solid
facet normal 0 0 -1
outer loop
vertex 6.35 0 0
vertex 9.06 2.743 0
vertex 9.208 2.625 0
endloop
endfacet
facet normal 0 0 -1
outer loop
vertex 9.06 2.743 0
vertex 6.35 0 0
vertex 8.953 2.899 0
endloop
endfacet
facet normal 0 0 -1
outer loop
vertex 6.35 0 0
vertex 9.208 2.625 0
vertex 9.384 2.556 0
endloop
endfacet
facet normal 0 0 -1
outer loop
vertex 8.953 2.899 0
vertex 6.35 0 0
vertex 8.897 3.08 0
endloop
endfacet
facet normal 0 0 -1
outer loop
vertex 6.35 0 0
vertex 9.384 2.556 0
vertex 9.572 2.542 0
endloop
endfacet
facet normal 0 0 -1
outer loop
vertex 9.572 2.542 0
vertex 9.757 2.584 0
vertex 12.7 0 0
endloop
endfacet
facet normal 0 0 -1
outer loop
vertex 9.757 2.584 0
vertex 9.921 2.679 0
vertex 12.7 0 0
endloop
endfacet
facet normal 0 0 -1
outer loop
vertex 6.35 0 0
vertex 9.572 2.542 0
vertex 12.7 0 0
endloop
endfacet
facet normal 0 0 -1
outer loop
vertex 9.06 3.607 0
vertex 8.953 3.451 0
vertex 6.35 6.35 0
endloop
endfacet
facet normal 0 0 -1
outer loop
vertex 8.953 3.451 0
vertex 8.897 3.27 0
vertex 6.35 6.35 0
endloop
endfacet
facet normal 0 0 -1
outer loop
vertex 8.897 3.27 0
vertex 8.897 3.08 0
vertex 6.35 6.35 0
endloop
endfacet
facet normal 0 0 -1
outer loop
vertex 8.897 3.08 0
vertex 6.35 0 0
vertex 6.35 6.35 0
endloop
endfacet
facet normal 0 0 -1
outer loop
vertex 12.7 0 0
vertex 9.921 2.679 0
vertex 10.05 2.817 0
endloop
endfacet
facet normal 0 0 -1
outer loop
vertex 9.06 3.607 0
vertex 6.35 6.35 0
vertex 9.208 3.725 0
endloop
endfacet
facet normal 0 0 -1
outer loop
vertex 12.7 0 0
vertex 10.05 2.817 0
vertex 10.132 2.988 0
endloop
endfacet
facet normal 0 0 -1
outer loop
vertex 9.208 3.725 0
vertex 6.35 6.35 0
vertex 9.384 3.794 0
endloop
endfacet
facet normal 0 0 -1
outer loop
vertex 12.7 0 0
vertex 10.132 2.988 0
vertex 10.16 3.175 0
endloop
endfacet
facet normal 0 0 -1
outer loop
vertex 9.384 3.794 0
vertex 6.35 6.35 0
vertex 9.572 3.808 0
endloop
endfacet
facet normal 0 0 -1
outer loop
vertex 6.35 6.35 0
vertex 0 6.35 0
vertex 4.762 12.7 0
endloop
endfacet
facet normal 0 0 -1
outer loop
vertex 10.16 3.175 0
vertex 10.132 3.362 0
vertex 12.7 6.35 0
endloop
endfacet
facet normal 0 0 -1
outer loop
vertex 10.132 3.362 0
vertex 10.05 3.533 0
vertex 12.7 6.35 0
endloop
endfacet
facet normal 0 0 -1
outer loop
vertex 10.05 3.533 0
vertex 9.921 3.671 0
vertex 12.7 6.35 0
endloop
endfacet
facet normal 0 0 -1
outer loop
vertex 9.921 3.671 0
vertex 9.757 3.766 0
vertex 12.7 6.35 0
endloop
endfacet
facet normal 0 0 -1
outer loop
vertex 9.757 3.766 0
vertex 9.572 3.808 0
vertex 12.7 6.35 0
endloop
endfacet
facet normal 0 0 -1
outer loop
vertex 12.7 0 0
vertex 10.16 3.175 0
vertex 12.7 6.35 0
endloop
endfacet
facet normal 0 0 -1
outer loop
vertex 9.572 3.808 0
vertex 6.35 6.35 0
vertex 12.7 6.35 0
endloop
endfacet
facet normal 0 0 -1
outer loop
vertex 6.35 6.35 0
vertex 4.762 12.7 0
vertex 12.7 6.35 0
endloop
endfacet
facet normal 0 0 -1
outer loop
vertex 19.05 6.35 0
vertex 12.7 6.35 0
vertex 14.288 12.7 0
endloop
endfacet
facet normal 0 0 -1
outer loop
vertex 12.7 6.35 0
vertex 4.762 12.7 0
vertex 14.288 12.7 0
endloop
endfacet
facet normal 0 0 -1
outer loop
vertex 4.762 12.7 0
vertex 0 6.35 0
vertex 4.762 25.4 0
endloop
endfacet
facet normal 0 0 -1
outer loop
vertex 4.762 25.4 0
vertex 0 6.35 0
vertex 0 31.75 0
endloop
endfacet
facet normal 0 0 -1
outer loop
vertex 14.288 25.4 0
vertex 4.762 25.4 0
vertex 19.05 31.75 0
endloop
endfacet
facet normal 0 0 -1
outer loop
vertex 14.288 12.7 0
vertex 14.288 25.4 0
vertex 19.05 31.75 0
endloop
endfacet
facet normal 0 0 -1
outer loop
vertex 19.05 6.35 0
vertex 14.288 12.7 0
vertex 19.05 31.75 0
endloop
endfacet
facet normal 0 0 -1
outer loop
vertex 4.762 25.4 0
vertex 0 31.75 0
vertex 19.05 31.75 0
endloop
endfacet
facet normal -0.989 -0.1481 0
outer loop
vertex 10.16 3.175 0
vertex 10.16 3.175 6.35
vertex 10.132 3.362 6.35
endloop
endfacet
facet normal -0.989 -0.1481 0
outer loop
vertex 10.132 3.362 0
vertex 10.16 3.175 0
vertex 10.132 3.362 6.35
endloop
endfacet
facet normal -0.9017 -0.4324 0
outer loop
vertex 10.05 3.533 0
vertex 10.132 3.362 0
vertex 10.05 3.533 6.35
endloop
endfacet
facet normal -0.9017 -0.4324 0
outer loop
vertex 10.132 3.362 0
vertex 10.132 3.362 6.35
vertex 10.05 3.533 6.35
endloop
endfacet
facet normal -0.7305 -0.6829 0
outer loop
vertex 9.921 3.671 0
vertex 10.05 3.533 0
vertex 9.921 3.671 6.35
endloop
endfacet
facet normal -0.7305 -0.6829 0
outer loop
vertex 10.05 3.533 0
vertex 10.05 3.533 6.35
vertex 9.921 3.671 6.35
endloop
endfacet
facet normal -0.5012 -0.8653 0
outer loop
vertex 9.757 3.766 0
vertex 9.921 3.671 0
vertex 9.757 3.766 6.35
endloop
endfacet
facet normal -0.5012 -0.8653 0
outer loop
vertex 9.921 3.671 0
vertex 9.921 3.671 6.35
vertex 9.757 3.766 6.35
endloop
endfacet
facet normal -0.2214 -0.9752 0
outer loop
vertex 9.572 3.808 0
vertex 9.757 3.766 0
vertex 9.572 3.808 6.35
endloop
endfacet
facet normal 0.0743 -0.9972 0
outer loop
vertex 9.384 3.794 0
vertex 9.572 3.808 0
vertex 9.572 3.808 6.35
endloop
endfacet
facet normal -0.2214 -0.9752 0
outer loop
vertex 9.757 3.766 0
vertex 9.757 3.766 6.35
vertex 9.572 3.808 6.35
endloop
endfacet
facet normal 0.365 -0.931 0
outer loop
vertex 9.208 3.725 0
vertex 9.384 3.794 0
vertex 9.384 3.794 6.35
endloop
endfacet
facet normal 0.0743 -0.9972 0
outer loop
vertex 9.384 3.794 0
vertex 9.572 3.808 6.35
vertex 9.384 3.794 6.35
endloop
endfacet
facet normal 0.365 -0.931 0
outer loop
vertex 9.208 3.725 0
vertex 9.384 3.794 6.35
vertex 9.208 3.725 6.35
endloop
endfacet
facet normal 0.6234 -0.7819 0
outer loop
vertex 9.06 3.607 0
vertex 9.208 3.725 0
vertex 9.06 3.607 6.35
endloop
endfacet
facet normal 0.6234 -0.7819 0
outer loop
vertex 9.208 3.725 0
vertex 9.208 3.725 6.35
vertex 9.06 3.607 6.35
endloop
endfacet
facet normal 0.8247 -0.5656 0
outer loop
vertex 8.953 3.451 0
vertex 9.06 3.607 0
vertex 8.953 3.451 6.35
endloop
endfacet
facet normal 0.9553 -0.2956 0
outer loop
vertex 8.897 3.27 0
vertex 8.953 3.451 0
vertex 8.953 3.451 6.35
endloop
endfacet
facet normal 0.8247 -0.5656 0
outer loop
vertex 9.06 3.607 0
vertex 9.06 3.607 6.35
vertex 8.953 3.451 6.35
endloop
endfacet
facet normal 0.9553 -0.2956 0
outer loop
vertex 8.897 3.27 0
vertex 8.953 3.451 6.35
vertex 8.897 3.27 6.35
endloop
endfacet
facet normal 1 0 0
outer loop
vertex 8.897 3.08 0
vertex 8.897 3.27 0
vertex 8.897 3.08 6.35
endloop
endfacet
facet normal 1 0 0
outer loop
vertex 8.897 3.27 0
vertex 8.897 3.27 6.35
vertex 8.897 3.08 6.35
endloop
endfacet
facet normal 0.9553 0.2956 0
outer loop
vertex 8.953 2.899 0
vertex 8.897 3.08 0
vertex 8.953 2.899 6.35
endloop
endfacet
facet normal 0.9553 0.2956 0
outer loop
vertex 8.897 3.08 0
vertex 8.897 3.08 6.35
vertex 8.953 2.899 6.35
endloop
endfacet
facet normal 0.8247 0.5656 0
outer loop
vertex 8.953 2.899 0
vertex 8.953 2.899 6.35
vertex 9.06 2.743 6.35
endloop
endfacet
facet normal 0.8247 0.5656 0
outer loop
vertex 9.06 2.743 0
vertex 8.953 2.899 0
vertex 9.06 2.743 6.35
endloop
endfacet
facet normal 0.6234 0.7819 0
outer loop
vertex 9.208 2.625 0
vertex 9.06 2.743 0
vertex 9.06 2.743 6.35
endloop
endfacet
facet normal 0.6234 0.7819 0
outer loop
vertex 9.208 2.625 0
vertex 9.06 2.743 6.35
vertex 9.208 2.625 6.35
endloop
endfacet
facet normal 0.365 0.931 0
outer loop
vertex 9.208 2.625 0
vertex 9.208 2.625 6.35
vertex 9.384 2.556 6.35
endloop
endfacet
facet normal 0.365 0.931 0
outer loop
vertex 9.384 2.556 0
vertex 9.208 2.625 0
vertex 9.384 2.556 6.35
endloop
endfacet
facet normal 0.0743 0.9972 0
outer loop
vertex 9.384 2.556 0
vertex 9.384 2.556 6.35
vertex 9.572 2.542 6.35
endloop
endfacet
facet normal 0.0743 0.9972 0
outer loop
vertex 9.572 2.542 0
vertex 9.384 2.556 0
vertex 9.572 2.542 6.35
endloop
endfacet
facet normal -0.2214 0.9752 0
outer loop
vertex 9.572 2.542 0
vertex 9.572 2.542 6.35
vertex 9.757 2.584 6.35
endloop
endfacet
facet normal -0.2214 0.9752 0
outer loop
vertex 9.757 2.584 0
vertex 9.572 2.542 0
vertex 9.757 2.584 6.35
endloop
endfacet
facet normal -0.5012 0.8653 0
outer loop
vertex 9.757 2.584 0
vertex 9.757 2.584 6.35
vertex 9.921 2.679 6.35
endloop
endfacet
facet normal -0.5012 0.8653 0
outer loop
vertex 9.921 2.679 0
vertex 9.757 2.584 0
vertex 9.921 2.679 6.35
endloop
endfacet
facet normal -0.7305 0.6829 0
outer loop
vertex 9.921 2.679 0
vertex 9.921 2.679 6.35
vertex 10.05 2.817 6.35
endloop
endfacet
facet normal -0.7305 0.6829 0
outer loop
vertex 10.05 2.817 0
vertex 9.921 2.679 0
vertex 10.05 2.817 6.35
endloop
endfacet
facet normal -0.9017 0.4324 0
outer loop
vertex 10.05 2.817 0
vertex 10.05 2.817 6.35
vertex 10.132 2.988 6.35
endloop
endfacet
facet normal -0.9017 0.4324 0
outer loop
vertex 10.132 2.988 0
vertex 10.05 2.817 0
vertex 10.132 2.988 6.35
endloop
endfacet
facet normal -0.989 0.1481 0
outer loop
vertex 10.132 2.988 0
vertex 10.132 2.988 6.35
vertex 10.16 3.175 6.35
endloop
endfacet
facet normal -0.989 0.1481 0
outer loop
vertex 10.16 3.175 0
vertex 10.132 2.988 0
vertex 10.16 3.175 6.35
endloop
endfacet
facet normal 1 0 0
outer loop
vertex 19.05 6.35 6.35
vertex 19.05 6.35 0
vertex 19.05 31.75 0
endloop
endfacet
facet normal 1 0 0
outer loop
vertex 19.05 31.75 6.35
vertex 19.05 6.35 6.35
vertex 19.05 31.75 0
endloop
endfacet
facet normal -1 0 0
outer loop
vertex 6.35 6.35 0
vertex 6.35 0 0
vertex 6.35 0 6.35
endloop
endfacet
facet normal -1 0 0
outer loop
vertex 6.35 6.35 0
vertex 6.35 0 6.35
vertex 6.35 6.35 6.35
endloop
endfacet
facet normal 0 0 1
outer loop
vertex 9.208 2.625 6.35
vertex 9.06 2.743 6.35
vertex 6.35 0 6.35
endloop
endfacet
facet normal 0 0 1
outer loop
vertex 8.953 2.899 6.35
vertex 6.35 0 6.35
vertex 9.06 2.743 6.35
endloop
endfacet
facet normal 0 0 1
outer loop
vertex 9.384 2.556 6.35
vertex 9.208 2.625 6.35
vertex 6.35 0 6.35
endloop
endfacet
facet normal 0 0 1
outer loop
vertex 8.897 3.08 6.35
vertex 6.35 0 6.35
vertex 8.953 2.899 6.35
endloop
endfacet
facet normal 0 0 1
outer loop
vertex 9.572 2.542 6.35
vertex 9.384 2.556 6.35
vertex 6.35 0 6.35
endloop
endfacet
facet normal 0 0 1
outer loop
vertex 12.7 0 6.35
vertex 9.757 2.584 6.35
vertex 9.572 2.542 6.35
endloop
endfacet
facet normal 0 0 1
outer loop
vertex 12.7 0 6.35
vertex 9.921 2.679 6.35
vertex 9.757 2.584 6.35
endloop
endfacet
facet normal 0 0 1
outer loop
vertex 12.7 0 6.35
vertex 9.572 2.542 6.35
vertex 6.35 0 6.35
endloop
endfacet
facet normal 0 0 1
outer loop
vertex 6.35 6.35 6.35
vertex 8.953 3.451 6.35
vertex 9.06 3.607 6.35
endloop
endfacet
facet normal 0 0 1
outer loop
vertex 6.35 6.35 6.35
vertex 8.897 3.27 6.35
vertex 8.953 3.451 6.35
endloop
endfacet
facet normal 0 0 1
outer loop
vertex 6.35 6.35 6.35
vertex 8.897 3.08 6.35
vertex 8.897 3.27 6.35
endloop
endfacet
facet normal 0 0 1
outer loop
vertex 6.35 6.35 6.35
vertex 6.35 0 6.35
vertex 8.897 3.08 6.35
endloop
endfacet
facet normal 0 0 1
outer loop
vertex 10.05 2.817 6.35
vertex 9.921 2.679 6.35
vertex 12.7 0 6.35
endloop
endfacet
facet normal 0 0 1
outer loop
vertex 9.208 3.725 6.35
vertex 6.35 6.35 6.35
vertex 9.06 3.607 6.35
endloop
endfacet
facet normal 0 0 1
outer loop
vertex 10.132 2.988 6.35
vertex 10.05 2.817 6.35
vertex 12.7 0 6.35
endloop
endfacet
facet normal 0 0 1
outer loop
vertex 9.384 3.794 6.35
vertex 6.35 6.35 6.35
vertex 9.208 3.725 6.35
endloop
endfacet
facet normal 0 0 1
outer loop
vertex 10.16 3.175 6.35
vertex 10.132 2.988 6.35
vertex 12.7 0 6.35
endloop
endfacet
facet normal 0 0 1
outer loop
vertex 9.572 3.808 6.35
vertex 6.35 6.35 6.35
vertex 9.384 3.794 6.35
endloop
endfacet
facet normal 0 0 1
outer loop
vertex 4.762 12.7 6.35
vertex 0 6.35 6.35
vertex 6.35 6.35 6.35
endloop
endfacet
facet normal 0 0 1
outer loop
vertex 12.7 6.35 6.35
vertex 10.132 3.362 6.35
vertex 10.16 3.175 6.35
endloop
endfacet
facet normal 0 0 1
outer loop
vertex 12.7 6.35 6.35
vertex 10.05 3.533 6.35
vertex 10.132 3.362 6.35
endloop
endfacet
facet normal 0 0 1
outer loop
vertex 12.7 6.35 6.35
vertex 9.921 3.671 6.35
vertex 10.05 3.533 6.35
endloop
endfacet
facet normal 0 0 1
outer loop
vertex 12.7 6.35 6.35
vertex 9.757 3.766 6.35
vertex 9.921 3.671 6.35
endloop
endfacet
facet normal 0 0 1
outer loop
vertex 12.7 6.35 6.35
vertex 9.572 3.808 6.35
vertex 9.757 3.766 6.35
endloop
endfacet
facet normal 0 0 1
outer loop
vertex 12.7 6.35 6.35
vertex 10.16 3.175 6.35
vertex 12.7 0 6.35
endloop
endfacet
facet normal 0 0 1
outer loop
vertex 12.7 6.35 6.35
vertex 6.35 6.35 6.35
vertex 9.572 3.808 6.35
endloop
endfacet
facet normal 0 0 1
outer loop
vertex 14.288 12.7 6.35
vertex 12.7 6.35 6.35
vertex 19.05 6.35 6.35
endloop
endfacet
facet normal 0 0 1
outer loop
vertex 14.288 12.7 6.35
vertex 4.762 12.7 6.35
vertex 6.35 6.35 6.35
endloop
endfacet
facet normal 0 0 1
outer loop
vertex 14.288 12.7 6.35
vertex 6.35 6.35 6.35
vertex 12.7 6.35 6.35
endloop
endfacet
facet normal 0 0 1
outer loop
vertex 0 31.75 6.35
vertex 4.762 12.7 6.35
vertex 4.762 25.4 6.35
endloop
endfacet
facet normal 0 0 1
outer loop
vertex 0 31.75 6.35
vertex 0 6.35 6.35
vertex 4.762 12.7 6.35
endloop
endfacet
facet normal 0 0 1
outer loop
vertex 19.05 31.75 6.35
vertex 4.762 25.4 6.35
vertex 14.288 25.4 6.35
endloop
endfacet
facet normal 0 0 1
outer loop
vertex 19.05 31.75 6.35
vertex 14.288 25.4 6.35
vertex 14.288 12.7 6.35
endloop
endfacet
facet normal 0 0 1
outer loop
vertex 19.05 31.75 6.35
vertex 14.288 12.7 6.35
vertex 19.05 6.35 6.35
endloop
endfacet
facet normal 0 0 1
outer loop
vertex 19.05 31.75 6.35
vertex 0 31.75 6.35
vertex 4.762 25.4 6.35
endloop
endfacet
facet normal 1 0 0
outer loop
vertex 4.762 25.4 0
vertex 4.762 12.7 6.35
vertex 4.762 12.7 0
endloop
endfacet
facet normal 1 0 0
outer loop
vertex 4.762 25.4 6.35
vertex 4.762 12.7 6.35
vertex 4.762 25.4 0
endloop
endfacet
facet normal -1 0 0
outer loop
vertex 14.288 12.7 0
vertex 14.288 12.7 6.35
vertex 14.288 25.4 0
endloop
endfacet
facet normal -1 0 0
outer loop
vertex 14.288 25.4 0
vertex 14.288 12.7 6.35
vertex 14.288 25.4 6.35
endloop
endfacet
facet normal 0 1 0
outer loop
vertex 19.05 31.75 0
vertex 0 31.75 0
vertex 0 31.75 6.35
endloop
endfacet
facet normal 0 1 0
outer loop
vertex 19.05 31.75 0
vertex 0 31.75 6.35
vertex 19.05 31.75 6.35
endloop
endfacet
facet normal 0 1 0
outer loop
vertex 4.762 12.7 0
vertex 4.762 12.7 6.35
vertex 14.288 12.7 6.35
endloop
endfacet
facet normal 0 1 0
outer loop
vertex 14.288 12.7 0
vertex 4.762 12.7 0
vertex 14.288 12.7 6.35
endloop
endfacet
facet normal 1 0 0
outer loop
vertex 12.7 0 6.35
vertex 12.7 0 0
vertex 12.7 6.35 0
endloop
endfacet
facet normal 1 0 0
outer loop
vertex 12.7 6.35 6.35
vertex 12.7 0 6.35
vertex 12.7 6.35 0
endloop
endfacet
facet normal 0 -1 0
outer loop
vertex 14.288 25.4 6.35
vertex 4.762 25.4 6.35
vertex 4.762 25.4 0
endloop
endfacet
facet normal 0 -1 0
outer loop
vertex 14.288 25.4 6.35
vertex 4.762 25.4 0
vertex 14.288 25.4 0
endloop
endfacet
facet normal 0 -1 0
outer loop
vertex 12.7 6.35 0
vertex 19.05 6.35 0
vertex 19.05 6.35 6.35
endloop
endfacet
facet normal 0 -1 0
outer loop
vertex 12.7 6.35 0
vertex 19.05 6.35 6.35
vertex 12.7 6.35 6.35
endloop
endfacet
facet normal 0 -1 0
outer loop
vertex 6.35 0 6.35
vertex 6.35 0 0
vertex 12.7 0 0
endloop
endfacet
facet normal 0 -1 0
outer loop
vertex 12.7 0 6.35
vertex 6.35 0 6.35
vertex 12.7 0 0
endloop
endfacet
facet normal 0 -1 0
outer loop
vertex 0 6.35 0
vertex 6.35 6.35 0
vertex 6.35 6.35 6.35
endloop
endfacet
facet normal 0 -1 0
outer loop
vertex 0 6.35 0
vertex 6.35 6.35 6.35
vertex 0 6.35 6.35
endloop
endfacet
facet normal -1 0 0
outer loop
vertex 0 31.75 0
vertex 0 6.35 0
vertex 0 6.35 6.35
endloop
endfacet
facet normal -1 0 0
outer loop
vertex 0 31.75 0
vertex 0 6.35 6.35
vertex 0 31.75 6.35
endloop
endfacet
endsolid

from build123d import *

# Parameters (mm, degrees)
SKETCH1_W           = 19.05
SKETCH1_H           = 31.75
BOSS_EXTRUDE1_DEPTH = 6.35
SKETCH2_W           = 9.525
SKETCH2_H           = 12.7
CUT_EXTRUDE1_DEPTH  = 6.35
SKETCH3_W           = 6.35
SKETCH3_H           = 6.35
CUT_EXTRUDE2_DEPTH  = 7.35
SKETCH4_R           = 0.635
CUT_EXTRUDE3_DEPTH  = 7.35


with BuildPart() as part:
    # Sketch1 → Boss-Extrude1 (new body)
    with BuildSketch(Plane.XY):
        with Locations((9.525, 15.875)):
            Rectangle(SKETCH1_W, SKETCH1_H)
    extrude(amount=BOSS_EXTRUDE1_DEPTH)

    # Sketch2 → Cut-Extrude1 (cut)
    with BuildSketch(Plane.XY.offset(6.35)):
        with Locations((9.525, 19.05)):
            Rectangle(SKETCH2_W, SKETCH2_H)
    extrude(amount=-CUT_EXTRUDE1_DEPTH, mode=Mode.SUBTRACT)

    # Sketch3 → Cut-Extrude2 (cut, through all)
    with BuildSketch(Plane(origin=(0, 0, 0), x_dir=(-1, 0, 0), z_dir=(0, 0, -1))):
        with Locations((-15.875, 3.175)):
            Rectangle(SKETCH3_W, SKETCH3_H)
        with Locations((-3.175, 3.175)):
            Rectangle(SKETCH3_W, SKETCH3_H)
    extrude(amount=-CUT_EXTRUDE2_DEPTH, mode=Mode.SUBTRACT)

    # Sketch4 → Cut-Extrude3 (cut, through all)
    with BuildSketch(Plane.XY.offset(6.35)):
        with Locations((9.525, 3.175)):
            Circle(SKETCH4_R)
    extrude(amount=-CUT_EXTRUDE3_DEPTH, mode=Mode.SUBTRACT)


solid = part.part
